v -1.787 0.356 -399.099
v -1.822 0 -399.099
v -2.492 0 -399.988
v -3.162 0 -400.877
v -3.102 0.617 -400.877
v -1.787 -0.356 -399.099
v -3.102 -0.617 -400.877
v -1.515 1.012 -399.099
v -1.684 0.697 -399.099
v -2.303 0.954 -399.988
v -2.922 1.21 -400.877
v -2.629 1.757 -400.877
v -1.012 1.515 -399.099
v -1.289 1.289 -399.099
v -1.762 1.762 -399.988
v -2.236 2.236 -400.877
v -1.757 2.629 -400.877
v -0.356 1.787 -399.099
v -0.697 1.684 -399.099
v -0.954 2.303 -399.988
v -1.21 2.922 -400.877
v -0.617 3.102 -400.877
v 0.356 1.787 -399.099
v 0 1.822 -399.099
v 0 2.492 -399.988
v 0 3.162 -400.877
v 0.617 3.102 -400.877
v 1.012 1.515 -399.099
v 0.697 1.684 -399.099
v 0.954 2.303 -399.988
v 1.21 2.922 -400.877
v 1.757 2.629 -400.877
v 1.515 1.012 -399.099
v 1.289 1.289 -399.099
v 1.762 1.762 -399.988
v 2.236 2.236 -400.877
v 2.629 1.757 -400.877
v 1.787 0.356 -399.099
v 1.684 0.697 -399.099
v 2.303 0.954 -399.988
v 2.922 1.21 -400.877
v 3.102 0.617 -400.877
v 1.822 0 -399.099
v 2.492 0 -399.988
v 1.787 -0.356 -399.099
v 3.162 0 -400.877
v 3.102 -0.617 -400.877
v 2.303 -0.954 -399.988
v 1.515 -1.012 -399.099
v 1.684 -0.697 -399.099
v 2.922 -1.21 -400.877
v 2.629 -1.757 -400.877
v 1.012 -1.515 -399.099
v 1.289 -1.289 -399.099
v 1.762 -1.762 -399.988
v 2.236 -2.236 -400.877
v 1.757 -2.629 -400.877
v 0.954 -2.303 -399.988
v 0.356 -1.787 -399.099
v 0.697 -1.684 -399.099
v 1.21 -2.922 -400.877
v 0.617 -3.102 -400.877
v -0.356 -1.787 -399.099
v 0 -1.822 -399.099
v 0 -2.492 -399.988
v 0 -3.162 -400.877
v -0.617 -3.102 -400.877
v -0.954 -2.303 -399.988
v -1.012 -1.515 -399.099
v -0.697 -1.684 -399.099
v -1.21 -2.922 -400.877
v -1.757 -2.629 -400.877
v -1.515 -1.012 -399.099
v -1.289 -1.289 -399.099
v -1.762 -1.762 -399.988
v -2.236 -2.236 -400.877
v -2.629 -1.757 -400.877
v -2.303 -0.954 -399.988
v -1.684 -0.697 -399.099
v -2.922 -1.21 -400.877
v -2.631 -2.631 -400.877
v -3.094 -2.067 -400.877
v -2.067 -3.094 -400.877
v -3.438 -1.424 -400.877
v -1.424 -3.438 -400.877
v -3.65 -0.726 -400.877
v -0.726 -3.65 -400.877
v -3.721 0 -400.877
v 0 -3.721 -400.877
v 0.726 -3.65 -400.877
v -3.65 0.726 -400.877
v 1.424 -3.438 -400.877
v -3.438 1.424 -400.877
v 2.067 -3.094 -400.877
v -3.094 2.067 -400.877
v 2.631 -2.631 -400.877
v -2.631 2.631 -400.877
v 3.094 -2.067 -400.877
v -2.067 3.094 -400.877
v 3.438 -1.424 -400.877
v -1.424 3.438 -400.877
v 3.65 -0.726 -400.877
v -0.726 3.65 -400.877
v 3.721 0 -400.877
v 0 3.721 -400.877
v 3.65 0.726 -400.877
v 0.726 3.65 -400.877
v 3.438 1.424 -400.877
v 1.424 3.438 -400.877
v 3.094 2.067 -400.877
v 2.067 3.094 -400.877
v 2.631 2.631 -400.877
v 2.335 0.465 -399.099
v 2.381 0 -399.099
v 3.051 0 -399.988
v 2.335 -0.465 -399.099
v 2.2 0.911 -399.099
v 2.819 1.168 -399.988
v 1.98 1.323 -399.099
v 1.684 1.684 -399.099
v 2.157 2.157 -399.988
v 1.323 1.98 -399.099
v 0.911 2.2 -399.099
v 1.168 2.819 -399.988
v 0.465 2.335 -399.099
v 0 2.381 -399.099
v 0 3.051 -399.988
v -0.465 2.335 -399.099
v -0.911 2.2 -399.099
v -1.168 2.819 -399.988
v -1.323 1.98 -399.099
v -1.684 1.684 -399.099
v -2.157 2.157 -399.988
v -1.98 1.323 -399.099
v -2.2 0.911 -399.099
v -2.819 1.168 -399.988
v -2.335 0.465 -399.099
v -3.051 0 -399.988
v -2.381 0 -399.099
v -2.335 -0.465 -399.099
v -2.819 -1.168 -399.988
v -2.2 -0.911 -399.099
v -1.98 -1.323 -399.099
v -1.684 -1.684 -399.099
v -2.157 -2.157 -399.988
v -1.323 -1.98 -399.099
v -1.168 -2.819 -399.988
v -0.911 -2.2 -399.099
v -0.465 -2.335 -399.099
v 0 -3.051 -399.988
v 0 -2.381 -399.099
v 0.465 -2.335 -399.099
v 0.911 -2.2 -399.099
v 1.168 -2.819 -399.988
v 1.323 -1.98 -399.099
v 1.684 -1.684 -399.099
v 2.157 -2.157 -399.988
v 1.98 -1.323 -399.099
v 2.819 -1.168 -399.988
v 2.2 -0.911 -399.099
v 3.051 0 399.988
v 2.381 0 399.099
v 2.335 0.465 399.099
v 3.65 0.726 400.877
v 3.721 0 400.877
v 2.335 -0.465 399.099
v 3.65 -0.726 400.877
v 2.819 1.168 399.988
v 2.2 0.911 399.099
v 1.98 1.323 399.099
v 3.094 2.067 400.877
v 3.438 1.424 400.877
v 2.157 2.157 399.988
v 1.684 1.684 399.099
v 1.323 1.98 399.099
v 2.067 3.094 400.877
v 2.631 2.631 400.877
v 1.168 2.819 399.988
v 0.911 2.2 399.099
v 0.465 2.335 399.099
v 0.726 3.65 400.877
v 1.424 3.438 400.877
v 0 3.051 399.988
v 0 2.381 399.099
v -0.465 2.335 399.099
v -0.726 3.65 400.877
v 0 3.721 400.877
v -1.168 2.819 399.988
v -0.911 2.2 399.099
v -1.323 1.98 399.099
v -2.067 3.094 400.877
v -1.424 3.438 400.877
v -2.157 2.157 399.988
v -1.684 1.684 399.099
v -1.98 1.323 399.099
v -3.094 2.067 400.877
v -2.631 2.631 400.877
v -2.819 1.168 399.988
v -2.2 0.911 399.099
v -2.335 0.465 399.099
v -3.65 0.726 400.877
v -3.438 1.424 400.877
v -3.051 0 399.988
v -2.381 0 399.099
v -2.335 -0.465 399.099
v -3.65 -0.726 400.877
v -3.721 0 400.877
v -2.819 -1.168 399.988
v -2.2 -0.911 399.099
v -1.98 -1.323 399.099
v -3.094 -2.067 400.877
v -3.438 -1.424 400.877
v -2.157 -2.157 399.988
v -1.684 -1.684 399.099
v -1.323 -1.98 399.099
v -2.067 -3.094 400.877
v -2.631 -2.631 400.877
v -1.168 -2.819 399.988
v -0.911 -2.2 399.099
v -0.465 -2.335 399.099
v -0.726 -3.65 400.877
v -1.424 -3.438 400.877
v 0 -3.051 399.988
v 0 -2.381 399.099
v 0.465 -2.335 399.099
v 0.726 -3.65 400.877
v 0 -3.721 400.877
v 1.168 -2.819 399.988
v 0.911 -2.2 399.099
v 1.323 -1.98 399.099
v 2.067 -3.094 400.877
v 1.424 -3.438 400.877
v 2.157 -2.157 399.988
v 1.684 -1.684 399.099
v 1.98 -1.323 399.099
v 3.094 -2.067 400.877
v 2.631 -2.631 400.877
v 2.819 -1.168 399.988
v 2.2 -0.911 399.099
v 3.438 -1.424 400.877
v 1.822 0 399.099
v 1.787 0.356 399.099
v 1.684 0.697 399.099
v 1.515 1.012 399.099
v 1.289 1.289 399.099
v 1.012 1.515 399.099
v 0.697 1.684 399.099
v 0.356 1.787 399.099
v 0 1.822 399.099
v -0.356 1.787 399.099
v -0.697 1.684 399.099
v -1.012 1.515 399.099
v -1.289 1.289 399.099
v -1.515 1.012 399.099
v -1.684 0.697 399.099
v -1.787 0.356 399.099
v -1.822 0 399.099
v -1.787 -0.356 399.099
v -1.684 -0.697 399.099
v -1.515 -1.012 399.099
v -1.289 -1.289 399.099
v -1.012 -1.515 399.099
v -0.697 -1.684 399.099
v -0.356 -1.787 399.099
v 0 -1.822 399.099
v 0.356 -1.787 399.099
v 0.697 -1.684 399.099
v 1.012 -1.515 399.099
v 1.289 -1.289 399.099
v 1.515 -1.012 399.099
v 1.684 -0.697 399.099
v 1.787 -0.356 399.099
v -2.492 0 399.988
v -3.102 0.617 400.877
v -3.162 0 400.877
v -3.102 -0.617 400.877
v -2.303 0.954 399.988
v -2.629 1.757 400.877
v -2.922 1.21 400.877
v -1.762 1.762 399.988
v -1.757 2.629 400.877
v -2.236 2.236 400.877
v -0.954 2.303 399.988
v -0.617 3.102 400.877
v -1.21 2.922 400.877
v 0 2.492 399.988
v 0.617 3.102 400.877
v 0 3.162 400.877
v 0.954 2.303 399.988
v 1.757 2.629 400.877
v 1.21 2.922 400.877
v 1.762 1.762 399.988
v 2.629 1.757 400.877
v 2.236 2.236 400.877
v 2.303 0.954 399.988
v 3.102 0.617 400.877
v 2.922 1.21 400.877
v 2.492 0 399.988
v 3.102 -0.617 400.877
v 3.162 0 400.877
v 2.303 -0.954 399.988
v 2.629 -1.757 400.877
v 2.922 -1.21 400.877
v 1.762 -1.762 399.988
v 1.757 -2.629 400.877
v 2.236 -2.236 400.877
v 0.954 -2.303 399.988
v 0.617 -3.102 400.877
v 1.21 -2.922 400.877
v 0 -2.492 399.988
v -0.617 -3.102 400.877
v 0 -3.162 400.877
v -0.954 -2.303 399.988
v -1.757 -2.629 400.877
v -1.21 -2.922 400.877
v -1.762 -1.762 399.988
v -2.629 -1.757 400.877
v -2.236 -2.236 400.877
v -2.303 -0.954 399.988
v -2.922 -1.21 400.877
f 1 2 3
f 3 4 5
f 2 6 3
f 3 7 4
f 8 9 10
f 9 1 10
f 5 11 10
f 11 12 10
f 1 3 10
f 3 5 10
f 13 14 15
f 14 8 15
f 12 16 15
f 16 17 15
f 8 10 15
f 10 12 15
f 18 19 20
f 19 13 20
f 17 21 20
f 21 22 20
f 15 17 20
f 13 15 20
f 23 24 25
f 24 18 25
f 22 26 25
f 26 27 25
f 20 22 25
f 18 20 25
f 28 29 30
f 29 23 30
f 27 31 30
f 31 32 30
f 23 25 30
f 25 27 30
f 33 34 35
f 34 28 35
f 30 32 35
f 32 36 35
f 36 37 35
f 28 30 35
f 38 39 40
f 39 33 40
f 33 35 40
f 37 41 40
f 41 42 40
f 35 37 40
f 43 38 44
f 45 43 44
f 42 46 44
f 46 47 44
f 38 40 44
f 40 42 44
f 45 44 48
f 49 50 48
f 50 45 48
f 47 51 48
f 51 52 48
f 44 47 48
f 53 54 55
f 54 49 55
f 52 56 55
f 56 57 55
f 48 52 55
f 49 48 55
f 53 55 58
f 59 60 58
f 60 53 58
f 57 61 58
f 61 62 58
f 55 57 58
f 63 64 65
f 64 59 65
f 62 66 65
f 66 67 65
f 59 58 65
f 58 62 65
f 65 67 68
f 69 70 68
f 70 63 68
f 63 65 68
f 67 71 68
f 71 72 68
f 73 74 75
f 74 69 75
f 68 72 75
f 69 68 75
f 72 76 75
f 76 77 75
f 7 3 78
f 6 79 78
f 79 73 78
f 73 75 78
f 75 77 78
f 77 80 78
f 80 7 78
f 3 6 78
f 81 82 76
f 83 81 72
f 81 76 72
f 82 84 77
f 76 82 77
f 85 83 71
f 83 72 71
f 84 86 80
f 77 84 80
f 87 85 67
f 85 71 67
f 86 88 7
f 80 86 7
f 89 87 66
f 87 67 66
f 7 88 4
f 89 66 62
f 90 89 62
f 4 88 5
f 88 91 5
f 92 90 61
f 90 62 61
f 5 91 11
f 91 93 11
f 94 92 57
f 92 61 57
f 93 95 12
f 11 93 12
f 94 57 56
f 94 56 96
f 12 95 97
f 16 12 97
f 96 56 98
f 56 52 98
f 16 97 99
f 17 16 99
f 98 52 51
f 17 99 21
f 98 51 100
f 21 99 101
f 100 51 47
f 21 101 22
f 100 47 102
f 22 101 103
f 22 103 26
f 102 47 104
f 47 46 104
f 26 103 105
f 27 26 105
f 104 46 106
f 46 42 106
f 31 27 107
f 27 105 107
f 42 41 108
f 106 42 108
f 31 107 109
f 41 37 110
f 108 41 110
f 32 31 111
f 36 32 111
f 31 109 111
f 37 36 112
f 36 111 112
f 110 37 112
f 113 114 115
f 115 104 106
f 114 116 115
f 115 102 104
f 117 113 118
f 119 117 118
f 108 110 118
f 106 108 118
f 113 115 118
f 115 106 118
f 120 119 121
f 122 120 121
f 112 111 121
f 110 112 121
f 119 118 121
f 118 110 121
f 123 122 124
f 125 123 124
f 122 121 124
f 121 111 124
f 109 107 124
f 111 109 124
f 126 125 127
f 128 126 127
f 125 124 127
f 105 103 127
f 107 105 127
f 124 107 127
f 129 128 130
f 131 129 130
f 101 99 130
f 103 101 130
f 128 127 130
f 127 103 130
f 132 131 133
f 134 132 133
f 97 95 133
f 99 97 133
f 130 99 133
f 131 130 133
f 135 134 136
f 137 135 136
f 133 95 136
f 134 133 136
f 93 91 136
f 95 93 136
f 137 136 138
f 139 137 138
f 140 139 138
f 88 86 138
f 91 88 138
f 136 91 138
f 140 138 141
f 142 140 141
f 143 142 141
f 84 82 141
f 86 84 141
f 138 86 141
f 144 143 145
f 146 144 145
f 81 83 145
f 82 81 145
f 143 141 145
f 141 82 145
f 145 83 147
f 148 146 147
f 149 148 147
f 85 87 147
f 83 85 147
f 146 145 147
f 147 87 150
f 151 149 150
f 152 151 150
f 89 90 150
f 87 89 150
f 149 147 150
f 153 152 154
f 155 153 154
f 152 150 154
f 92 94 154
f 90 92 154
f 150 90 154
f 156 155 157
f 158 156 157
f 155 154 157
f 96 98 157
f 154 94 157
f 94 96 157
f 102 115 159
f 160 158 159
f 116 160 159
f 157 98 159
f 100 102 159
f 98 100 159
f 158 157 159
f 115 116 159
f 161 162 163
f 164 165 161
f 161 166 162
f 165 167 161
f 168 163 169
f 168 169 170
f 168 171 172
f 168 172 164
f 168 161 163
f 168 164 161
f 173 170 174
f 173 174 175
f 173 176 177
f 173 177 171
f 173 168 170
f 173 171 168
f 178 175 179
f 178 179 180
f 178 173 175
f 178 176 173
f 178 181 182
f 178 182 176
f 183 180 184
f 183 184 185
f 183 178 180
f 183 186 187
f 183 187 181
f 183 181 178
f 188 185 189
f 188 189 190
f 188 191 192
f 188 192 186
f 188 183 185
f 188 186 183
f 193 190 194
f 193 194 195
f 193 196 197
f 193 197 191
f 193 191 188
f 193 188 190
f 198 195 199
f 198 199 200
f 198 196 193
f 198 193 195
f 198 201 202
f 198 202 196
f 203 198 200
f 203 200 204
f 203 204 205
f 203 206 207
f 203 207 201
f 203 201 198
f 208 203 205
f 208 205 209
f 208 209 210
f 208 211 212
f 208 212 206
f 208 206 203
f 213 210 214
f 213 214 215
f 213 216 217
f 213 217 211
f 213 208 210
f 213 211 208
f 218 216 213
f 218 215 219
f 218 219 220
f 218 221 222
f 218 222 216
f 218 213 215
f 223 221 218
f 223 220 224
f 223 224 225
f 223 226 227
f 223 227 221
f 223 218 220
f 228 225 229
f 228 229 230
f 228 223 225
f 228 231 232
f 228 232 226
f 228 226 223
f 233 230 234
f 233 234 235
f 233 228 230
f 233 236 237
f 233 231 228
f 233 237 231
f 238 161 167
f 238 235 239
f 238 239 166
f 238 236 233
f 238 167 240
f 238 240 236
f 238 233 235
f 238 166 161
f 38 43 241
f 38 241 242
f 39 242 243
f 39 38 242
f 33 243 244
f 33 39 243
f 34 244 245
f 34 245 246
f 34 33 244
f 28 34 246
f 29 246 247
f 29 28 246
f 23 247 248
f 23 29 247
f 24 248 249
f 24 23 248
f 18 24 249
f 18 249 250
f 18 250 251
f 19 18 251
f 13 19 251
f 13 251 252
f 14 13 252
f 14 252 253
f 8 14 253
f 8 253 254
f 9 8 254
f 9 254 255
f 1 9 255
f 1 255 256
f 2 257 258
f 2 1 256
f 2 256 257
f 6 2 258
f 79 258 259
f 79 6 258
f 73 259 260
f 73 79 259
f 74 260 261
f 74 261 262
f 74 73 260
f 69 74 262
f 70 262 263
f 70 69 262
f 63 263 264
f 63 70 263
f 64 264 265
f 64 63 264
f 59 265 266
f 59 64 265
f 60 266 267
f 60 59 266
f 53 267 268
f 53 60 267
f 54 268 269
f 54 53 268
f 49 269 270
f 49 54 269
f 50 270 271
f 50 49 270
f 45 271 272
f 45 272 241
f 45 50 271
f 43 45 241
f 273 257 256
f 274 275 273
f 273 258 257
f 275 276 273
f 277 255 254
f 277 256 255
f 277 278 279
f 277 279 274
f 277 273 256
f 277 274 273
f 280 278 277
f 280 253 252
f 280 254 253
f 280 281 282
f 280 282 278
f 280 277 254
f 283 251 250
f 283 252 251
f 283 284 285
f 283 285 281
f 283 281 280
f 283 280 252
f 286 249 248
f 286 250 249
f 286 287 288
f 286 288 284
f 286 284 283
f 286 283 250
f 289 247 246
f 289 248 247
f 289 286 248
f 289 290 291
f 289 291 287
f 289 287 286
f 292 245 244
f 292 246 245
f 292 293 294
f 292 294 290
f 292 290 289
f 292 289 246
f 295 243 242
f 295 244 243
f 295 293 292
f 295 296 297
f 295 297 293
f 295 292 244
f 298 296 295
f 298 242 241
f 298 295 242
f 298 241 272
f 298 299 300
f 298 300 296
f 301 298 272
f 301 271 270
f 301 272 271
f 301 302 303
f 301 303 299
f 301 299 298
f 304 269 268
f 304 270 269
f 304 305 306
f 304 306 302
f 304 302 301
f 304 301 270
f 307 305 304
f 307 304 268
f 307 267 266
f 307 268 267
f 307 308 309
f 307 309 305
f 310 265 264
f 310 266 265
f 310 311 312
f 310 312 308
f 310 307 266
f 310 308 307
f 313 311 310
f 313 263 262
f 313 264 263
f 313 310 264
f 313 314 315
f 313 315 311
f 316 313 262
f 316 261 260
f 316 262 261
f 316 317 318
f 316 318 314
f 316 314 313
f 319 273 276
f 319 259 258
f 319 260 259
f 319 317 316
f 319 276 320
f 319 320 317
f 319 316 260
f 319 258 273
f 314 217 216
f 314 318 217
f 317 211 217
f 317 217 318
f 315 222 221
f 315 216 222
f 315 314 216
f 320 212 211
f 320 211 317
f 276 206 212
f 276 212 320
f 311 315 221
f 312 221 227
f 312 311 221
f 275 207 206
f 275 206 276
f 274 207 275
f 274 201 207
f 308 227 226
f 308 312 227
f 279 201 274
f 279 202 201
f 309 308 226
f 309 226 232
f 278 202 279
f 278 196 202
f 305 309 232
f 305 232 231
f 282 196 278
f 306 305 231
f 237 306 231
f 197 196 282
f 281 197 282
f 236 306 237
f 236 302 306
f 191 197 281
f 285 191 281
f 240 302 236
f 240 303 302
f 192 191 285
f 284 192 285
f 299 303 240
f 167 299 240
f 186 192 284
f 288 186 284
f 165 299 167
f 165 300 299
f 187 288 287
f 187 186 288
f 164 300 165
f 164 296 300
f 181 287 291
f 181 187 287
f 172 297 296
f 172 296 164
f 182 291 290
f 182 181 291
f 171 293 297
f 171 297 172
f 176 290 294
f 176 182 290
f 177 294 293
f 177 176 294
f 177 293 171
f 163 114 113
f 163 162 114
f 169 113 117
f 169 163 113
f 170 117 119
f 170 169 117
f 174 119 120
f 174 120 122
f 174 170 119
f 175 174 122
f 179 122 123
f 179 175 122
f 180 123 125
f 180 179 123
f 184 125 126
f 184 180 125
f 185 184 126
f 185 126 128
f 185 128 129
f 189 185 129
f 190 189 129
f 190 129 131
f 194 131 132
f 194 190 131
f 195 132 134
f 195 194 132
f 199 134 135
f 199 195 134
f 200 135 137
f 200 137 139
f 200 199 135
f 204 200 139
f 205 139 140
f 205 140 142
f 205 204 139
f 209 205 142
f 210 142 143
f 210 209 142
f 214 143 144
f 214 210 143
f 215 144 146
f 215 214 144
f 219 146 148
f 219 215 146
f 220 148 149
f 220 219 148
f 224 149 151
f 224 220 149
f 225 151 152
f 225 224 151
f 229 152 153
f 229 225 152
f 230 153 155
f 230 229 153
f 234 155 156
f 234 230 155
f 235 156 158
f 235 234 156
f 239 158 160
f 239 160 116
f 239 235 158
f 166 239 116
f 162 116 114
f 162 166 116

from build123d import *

# Parameters (mm, degrees)
SKETCH1_R           = 2.38125
SKETCH1_R_2         = 1.82245
BOSS_EXTRUDE1_DEPTH = 399.09877
SKETCH2_R           = 2.38125
BOSS_EXTRUDE2_DEPTH = 1.778
BOSS_EXTRUDE2_TAPER = -37
SKETCH3_R           = 1.82245
CUT_EXTRUDE1_DEPTH  = 2.7780001
CUT_EXTRUDE1_TAPER  = -37


with BuildPart() as part:
    # Sketch1 → Boss-Extrude1 (new body, symmetric)
    with BuildSketch(Plane.XY):
        Circle(SKETCH1_R)
        Circle(SKETCH1_R_2, mode=Mode.SUBTRACT)
    extrude(amount=BOSS_EXTRUDE1_DEPTH, both=True)

    # Sketch2 → Boss-Extrude2 (add)
    with BuildSketch(Plane.XY.offset(399.09877)):
        Circle(SKETCH2_R)
    boss_extrude2 = extrude(amount=BOSS_EXTRUDE2_DEPTH, taper=BOSS_EXTRUDE2_TAPER)

    # Sketch3 → Cut-Extrude1 (cut, through all)
    with BuildSketch(Plane(origin=(0, 0, 399.09877), x_dir=(-1, 0, 0), z_dir=(0, 0, -1))):
        Circle(SKETCH3_R)
    cut_extrude1 = extrude(amount=-CUT_EXTRUDE1_DEPTH, taper=CUT_EXTRUDE1_TAPER, mode=Mode.SUBTRACT)

    # Mirror1: Boss-Extrude2, Cut-Extrude1 across plane
    add(boss_extrude2.mirror(Plane.XY))
    add(cut_extrude1.mirror(Plane.XY), mode=Mode.SUBTRACT)


solid = part.part
